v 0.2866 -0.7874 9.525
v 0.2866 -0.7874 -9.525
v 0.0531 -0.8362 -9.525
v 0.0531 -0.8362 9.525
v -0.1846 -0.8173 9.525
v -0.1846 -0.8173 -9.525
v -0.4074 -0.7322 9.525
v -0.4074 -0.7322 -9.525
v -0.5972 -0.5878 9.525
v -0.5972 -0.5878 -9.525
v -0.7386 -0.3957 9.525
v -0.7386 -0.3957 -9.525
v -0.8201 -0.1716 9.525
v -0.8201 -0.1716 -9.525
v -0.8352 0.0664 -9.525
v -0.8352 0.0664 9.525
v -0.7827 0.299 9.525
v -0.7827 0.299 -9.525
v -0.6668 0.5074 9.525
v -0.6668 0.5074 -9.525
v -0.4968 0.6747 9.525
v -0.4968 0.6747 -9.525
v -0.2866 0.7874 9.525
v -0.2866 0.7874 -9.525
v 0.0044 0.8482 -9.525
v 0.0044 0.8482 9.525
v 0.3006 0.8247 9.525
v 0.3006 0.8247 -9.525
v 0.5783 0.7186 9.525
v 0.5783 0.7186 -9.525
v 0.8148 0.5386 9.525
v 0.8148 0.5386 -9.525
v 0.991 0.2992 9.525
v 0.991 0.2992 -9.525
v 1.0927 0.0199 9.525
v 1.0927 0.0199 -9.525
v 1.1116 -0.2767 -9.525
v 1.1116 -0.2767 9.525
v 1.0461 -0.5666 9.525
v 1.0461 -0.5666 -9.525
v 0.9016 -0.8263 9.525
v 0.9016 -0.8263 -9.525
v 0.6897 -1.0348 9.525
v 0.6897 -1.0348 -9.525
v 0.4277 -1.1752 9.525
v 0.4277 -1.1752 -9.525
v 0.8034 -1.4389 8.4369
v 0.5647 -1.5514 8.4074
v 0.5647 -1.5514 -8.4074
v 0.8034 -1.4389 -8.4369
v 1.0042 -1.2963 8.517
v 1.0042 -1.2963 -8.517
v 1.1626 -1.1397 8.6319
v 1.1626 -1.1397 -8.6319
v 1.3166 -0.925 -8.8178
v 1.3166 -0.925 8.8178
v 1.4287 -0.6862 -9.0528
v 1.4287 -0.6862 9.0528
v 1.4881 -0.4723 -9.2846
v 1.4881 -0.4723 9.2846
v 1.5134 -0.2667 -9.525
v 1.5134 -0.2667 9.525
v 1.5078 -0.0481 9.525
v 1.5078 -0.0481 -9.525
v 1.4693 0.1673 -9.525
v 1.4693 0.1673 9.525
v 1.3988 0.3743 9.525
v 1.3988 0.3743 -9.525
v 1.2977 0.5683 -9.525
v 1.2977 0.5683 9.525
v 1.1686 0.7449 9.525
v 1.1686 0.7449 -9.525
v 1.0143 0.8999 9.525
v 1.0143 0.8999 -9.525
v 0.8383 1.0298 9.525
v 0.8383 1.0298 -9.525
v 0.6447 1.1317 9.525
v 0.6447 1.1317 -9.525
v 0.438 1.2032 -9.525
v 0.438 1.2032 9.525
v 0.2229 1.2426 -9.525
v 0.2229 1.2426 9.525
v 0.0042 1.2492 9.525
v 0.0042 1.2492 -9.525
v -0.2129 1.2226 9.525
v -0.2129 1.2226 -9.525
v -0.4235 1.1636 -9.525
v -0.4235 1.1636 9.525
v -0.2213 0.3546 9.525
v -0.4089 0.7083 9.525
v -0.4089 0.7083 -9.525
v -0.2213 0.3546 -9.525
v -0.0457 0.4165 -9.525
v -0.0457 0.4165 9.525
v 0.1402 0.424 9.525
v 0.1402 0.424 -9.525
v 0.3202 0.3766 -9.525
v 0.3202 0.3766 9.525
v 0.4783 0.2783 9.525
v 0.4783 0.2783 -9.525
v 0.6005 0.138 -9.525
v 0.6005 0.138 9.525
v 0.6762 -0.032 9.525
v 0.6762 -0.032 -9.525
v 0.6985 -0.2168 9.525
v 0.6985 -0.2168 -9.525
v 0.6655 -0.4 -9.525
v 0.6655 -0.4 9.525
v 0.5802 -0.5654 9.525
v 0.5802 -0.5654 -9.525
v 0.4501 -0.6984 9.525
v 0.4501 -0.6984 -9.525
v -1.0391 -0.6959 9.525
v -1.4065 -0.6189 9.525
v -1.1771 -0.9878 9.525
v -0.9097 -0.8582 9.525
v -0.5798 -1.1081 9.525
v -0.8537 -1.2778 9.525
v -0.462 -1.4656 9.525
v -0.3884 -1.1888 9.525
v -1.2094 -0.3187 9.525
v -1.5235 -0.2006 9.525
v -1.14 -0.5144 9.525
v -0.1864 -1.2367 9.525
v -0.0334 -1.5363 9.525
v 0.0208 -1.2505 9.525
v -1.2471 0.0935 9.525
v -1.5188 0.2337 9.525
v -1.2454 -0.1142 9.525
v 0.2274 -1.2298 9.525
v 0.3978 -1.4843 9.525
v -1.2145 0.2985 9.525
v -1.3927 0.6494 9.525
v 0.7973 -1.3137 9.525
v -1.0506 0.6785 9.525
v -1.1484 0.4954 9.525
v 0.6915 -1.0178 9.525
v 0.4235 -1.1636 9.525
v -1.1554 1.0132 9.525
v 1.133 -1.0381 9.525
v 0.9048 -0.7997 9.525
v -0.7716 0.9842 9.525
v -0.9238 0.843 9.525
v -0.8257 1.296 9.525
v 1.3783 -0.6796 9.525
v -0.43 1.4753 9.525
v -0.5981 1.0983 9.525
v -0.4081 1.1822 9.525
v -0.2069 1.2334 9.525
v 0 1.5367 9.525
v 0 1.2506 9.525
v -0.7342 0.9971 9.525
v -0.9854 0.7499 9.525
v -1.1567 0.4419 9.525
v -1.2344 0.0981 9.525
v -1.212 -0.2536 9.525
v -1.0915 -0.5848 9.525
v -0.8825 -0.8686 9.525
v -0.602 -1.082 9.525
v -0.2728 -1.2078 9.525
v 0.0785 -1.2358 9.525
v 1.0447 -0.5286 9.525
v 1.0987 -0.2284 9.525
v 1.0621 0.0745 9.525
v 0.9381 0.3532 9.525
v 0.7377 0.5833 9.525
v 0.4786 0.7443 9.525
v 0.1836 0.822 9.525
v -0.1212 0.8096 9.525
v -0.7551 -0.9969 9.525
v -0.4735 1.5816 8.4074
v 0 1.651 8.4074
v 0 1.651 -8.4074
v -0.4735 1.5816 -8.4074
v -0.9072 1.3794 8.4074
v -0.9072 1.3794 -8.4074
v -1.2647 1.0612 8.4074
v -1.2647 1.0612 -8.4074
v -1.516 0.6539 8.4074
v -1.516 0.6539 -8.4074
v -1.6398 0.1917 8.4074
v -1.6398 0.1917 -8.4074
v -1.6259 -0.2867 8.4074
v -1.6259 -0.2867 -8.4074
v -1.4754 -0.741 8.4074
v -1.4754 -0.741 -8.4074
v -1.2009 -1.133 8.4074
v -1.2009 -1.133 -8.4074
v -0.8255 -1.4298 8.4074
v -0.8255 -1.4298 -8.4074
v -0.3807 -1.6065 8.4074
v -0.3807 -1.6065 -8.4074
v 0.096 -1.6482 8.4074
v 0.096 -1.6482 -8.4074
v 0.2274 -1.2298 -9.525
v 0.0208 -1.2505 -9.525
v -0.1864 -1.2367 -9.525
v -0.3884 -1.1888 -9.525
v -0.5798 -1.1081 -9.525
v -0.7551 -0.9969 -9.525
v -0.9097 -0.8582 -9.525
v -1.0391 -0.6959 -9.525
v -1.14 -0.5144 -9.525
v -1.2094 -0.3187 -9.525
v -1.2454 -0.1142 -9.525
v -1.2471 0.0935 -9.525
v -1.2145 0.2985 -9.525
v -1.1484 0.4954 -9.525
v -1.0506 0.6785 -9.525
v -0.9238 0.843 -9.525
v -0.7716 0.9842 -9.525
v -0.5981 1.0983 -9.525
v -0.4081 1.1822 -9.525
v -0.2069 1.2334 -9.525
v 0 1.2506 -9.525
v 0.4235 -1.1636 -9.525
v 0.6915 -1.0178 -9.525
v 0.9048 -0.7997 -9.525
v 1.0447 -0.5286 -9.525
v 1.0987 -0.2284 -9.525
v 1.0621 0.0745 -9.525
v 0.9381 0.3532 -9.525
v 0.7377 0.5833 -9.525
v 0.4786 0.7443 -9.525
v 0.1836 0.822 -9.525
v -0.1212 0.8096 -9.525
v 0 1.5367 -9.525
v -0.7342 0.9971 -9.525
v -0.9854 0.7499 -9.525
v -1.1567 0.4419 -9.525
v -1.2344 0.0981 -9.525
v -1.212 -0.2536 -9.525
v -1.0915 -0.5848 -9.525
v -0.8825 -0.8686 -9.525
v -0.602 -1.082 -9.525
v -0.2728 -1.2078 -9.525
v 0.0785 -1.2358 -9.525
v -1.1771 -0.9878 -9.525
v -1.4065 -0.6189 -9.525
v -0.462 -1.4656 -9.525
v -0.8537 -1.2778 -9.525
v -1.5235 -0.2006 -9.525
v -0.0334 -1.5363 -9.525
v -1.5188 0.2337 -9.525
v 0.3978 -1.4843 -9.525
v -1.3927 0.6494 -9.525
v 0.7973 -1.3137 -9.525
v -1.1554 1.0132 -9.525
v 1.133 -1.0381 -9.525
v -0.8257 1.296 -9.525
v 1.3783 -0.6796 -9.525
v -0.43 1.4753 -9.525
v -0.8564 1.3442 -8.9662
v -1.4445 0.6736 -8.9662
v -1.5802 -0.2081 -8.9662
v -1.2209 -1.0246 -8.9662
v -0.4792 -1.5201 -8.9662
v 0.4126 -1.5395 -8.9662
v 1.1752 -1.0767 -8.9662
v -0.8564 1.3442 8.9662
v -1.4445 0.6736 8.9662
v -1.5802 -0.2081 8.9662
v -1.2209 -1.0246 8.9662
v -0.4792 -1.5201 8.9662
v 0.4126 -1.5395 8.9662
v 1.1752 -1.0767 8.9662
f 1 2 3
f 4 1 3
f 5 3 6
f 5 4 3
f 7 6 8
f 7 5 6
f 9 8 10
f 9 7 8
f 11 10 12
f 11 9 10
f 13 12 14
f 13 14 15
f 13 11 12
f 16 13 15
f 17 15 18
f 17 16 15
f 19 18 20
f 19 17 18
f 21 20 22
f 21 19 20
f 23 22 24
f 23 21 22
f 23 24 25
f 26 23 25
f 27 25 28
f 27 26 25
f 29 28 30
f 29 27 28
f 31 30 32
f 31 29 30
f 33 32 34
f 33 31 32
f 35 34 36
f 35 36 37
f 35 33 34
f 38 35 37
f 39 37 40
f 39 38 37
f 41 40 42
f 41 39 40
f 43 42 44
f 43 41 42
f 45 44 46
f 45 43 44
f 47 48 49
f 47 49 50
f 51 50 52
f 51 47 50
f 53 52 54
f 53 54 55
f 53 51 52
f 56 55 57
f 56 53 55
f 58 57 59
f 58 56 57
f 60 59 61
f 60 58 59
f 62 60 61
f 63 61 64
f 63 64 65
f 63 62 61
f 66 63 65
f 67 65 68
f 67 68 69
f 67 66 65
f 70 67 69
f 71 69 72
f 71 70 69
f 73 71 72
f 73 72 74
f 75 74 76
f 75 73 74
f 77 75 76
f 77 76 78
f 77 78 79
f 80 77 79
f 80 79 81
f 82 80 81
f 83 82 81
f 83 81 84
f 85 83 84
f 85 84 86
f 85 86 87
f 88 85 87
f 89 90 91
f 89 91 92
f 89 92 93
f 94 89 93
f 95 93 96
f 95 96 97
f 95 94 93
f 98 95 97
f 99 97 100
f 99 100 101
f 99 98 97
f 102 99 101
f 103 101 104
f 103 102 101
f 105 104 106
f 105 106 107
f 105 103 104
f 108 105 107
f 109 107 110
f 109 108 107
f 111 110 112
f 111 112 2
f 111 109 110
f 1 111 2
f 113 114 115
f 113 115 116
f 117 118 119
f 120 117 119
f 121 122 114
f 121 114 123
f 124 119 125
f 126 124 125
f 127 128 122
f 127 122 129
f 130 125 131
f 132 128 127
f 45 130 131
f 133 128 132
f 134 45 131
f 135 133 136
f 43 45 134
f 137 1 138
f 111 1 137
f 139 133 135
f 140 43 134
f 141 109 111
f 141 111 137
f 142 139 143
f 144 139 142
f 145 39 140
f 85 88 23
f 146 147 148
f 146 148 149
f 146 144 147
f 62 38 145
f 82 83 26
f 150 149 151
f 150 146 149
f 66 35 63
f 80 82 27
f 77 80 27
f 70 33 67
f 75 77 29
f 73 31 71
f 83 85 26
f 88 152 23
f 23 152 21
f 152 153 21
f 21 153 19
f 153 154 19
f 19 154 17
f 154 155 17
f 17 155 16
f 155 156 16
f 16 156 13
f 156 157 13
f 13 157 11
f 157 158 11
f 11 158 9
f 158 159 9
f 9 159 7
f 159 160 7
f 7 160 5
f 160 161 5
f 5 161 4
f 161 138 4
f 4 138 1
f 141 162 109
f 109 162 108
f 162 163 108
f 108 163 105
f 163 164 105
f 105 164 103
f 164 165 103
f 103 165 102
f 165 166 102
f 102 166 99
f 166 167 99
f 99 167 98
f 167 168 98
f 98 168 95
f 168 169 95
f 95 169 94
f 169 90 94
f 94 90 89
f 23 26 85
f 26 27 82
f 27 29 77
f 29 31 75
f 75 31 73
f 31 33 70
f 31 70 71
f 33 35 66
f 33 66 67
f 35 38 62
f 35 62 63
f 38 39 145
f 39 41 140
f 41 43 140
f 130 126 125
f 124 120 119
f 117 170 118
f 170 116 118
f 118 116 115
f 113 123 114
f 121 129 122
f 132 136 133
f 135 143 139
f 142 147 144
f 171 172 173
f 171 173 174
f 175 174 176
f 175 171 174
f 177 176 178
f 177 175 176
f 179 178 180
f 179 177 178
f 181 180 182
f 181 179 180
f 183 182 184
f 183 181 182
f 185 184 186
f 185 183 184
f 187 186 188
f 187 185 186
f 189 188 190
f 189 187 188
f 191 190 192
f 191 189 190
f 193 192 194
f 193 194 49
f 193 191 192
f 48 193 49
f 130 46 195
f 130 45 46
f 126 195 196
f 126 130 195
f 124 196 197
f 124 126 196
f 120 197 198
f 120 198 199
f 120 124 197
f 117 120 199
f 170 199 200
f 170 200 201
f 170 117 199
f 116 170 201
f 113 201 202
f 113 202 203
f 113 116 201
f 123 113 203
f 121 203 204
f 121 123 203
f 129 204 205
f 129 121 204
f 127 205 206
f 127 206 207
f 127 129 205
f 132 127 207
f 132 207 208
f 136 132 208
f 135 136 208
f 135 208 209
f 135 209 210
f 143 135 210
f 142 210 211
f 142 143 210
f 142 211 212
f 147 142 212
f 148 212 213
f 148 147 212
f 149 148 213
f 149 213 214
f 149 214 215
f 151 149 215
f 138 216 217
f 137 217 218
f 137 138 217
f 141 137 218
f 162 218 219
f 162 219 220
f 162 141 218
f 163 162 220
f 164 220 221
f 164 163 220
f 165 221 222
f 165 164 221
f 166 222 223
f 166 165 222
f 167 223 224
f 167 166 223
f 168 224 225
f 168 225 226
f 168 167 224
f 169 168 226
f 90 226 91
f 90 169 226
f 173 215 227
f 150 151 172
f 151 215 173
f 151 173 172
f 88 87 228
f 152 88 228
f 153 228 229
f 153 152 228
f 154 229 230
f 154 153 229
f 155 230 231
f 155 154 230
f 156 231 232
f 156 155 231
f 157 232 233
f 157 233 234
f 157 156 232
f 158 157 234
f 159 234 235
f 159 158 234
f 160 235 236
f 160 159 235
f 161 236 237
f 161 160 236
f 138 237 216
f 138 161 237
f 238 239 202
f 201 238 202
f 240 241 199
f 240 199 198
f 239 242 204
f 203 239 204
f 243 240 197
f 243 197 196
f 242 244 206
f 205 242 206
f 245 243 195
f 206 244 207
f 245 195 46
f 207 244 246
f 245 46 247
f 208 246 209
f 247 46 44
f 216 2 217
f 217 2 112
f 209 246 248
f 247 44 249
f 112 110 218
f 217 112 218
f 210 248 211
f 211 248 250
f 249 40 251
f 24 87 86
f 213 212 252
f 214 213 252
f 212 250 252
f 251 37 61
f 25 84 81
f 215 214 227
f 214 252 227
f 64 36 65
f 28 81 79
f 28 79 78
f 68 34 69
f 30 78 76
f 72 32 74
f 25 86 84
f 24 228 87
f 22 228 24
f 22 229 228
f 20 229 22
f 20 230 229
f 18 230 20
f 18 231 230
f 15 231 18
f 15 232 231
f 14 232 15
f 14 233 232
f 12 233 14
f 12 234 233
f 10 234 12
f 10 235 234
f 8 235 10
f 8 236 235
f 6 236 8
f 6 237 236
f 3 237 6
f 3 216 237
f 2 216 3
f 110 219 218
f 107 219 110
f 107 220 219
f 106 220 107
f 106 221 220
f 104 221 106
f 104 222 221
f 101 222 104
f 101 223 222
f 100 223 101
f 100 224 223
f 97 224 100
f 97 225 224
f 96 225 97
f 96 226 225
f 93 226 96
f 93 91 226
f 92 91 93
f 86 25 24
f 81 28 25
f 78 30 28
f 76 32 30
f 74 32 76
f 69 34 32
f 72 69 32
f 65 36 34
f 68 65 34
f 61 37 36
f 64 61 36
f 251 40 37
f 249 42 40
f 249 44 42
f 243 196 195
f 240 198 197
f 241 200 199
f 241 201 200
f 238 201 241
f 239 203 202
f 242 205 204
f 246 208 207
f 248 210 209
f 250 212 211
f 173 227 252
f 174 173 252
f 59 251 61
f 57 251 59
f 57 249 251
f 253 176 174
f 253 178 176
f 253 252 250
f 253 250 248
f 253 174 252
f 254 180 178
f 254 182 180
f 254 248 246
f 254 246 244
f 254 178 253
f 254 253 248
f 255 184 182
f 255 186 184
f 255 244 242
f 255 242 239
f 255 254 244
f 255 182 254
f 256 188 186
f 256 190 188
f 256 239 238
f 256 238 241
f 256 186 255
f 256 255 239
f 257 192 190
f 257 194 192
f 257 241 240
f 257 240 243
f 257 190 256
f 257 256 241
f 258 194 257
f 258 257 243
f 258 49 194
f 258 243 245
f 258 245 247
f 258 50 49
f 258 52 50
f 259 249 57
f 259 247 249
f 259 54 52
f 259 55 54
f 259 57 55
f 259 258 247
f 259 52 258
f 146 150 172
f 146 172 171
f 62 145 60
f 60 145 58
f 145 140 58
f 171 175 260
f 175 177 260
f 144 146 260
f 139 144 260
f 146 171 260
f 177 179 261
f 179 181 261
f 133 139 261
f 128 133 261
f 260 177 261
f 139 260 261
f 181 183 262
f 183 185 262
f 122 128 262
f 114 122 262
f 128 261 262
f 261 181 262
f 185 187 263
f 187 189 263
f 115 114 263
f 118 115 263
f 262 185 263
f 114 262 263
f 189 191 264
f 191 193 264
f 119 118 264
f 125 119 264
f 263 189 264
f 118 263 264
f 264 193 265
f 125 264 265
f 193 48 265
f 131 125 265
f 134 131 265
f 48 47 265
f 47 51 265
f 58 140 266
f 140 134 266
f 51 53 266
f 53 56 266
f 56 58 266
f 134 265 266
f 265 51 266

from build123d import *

# Parameters (mm, degrees)
EXTRUDE_THIN1_DEPTH = 9.525


with BuildPart() as part:
    # Sketch2 → Extrude-Thin1 (new, symmetric)
    with BuildSketch(Plane.XY):
        with BuildLine():
            ThreePointArc((0, 1.651), (-1.6259176, -0.286693141), (0.564675257, -1.551432517))
            ThreePointArc((0.564675257, -1.551432517), (1.428087859, 0.300161785), (-0.423506442, 1.163574388))
            ThreePointArc((-0.423506442, 1.163574388), (-1.163574388, -0.423506442), (0.423506442, -1.163574388))
            ThreePointArc((0.423506442, -1.163574388), (1.010514268, 0.218497398), (-0.408926516, 0.708281502))
            Line((-0.408926516, 0.708281502), (-0.22127156, 0.354615342))
            ThreePointArc((-0.22127156, 0.354615342), (0.644689881, 0.055811649), (0.286572693, -0.787352002))
            ThreePointArc((0.286572693, -0.787352002), (-0.787352002, -0.286572693), (-0.286572693, 0.787352002))
            ThreePointArc((-0.286572693, 0.787352002), (1.051865474, 0.163228035), (0.427741507, -1.175210132))
            ThreePointArc((0.427741507, -1.175210132), (-1.231632582, -0.217170055), (0, 1.2506325))
            Line((0, 1.2506325), (0, 1.651))
        make_face()
    extrude(amount=EXTRUDE_THIN1_DEPTH, both=True)

    # Sketch3 → Cut-Revolve1 (revolve, cut)
    with BuildSketch(Plane(origin=(0, 0, 0), x_dir=(0, 0, -1), z_dir=(1, 0, 0))):
        Polygon((-9.525, 1.651), (-9.525, 1.5367), (-8.4074, 1.651), align=None)
        Polygon((8.4074, 1.651), (9.525, 1.651), (9.525, 1.5367), align=None)
    revolve(axis=Axis((0, 0, 0), (0, 0, 1)), mode=Mode.SUBTRACT)


solid = part.part
